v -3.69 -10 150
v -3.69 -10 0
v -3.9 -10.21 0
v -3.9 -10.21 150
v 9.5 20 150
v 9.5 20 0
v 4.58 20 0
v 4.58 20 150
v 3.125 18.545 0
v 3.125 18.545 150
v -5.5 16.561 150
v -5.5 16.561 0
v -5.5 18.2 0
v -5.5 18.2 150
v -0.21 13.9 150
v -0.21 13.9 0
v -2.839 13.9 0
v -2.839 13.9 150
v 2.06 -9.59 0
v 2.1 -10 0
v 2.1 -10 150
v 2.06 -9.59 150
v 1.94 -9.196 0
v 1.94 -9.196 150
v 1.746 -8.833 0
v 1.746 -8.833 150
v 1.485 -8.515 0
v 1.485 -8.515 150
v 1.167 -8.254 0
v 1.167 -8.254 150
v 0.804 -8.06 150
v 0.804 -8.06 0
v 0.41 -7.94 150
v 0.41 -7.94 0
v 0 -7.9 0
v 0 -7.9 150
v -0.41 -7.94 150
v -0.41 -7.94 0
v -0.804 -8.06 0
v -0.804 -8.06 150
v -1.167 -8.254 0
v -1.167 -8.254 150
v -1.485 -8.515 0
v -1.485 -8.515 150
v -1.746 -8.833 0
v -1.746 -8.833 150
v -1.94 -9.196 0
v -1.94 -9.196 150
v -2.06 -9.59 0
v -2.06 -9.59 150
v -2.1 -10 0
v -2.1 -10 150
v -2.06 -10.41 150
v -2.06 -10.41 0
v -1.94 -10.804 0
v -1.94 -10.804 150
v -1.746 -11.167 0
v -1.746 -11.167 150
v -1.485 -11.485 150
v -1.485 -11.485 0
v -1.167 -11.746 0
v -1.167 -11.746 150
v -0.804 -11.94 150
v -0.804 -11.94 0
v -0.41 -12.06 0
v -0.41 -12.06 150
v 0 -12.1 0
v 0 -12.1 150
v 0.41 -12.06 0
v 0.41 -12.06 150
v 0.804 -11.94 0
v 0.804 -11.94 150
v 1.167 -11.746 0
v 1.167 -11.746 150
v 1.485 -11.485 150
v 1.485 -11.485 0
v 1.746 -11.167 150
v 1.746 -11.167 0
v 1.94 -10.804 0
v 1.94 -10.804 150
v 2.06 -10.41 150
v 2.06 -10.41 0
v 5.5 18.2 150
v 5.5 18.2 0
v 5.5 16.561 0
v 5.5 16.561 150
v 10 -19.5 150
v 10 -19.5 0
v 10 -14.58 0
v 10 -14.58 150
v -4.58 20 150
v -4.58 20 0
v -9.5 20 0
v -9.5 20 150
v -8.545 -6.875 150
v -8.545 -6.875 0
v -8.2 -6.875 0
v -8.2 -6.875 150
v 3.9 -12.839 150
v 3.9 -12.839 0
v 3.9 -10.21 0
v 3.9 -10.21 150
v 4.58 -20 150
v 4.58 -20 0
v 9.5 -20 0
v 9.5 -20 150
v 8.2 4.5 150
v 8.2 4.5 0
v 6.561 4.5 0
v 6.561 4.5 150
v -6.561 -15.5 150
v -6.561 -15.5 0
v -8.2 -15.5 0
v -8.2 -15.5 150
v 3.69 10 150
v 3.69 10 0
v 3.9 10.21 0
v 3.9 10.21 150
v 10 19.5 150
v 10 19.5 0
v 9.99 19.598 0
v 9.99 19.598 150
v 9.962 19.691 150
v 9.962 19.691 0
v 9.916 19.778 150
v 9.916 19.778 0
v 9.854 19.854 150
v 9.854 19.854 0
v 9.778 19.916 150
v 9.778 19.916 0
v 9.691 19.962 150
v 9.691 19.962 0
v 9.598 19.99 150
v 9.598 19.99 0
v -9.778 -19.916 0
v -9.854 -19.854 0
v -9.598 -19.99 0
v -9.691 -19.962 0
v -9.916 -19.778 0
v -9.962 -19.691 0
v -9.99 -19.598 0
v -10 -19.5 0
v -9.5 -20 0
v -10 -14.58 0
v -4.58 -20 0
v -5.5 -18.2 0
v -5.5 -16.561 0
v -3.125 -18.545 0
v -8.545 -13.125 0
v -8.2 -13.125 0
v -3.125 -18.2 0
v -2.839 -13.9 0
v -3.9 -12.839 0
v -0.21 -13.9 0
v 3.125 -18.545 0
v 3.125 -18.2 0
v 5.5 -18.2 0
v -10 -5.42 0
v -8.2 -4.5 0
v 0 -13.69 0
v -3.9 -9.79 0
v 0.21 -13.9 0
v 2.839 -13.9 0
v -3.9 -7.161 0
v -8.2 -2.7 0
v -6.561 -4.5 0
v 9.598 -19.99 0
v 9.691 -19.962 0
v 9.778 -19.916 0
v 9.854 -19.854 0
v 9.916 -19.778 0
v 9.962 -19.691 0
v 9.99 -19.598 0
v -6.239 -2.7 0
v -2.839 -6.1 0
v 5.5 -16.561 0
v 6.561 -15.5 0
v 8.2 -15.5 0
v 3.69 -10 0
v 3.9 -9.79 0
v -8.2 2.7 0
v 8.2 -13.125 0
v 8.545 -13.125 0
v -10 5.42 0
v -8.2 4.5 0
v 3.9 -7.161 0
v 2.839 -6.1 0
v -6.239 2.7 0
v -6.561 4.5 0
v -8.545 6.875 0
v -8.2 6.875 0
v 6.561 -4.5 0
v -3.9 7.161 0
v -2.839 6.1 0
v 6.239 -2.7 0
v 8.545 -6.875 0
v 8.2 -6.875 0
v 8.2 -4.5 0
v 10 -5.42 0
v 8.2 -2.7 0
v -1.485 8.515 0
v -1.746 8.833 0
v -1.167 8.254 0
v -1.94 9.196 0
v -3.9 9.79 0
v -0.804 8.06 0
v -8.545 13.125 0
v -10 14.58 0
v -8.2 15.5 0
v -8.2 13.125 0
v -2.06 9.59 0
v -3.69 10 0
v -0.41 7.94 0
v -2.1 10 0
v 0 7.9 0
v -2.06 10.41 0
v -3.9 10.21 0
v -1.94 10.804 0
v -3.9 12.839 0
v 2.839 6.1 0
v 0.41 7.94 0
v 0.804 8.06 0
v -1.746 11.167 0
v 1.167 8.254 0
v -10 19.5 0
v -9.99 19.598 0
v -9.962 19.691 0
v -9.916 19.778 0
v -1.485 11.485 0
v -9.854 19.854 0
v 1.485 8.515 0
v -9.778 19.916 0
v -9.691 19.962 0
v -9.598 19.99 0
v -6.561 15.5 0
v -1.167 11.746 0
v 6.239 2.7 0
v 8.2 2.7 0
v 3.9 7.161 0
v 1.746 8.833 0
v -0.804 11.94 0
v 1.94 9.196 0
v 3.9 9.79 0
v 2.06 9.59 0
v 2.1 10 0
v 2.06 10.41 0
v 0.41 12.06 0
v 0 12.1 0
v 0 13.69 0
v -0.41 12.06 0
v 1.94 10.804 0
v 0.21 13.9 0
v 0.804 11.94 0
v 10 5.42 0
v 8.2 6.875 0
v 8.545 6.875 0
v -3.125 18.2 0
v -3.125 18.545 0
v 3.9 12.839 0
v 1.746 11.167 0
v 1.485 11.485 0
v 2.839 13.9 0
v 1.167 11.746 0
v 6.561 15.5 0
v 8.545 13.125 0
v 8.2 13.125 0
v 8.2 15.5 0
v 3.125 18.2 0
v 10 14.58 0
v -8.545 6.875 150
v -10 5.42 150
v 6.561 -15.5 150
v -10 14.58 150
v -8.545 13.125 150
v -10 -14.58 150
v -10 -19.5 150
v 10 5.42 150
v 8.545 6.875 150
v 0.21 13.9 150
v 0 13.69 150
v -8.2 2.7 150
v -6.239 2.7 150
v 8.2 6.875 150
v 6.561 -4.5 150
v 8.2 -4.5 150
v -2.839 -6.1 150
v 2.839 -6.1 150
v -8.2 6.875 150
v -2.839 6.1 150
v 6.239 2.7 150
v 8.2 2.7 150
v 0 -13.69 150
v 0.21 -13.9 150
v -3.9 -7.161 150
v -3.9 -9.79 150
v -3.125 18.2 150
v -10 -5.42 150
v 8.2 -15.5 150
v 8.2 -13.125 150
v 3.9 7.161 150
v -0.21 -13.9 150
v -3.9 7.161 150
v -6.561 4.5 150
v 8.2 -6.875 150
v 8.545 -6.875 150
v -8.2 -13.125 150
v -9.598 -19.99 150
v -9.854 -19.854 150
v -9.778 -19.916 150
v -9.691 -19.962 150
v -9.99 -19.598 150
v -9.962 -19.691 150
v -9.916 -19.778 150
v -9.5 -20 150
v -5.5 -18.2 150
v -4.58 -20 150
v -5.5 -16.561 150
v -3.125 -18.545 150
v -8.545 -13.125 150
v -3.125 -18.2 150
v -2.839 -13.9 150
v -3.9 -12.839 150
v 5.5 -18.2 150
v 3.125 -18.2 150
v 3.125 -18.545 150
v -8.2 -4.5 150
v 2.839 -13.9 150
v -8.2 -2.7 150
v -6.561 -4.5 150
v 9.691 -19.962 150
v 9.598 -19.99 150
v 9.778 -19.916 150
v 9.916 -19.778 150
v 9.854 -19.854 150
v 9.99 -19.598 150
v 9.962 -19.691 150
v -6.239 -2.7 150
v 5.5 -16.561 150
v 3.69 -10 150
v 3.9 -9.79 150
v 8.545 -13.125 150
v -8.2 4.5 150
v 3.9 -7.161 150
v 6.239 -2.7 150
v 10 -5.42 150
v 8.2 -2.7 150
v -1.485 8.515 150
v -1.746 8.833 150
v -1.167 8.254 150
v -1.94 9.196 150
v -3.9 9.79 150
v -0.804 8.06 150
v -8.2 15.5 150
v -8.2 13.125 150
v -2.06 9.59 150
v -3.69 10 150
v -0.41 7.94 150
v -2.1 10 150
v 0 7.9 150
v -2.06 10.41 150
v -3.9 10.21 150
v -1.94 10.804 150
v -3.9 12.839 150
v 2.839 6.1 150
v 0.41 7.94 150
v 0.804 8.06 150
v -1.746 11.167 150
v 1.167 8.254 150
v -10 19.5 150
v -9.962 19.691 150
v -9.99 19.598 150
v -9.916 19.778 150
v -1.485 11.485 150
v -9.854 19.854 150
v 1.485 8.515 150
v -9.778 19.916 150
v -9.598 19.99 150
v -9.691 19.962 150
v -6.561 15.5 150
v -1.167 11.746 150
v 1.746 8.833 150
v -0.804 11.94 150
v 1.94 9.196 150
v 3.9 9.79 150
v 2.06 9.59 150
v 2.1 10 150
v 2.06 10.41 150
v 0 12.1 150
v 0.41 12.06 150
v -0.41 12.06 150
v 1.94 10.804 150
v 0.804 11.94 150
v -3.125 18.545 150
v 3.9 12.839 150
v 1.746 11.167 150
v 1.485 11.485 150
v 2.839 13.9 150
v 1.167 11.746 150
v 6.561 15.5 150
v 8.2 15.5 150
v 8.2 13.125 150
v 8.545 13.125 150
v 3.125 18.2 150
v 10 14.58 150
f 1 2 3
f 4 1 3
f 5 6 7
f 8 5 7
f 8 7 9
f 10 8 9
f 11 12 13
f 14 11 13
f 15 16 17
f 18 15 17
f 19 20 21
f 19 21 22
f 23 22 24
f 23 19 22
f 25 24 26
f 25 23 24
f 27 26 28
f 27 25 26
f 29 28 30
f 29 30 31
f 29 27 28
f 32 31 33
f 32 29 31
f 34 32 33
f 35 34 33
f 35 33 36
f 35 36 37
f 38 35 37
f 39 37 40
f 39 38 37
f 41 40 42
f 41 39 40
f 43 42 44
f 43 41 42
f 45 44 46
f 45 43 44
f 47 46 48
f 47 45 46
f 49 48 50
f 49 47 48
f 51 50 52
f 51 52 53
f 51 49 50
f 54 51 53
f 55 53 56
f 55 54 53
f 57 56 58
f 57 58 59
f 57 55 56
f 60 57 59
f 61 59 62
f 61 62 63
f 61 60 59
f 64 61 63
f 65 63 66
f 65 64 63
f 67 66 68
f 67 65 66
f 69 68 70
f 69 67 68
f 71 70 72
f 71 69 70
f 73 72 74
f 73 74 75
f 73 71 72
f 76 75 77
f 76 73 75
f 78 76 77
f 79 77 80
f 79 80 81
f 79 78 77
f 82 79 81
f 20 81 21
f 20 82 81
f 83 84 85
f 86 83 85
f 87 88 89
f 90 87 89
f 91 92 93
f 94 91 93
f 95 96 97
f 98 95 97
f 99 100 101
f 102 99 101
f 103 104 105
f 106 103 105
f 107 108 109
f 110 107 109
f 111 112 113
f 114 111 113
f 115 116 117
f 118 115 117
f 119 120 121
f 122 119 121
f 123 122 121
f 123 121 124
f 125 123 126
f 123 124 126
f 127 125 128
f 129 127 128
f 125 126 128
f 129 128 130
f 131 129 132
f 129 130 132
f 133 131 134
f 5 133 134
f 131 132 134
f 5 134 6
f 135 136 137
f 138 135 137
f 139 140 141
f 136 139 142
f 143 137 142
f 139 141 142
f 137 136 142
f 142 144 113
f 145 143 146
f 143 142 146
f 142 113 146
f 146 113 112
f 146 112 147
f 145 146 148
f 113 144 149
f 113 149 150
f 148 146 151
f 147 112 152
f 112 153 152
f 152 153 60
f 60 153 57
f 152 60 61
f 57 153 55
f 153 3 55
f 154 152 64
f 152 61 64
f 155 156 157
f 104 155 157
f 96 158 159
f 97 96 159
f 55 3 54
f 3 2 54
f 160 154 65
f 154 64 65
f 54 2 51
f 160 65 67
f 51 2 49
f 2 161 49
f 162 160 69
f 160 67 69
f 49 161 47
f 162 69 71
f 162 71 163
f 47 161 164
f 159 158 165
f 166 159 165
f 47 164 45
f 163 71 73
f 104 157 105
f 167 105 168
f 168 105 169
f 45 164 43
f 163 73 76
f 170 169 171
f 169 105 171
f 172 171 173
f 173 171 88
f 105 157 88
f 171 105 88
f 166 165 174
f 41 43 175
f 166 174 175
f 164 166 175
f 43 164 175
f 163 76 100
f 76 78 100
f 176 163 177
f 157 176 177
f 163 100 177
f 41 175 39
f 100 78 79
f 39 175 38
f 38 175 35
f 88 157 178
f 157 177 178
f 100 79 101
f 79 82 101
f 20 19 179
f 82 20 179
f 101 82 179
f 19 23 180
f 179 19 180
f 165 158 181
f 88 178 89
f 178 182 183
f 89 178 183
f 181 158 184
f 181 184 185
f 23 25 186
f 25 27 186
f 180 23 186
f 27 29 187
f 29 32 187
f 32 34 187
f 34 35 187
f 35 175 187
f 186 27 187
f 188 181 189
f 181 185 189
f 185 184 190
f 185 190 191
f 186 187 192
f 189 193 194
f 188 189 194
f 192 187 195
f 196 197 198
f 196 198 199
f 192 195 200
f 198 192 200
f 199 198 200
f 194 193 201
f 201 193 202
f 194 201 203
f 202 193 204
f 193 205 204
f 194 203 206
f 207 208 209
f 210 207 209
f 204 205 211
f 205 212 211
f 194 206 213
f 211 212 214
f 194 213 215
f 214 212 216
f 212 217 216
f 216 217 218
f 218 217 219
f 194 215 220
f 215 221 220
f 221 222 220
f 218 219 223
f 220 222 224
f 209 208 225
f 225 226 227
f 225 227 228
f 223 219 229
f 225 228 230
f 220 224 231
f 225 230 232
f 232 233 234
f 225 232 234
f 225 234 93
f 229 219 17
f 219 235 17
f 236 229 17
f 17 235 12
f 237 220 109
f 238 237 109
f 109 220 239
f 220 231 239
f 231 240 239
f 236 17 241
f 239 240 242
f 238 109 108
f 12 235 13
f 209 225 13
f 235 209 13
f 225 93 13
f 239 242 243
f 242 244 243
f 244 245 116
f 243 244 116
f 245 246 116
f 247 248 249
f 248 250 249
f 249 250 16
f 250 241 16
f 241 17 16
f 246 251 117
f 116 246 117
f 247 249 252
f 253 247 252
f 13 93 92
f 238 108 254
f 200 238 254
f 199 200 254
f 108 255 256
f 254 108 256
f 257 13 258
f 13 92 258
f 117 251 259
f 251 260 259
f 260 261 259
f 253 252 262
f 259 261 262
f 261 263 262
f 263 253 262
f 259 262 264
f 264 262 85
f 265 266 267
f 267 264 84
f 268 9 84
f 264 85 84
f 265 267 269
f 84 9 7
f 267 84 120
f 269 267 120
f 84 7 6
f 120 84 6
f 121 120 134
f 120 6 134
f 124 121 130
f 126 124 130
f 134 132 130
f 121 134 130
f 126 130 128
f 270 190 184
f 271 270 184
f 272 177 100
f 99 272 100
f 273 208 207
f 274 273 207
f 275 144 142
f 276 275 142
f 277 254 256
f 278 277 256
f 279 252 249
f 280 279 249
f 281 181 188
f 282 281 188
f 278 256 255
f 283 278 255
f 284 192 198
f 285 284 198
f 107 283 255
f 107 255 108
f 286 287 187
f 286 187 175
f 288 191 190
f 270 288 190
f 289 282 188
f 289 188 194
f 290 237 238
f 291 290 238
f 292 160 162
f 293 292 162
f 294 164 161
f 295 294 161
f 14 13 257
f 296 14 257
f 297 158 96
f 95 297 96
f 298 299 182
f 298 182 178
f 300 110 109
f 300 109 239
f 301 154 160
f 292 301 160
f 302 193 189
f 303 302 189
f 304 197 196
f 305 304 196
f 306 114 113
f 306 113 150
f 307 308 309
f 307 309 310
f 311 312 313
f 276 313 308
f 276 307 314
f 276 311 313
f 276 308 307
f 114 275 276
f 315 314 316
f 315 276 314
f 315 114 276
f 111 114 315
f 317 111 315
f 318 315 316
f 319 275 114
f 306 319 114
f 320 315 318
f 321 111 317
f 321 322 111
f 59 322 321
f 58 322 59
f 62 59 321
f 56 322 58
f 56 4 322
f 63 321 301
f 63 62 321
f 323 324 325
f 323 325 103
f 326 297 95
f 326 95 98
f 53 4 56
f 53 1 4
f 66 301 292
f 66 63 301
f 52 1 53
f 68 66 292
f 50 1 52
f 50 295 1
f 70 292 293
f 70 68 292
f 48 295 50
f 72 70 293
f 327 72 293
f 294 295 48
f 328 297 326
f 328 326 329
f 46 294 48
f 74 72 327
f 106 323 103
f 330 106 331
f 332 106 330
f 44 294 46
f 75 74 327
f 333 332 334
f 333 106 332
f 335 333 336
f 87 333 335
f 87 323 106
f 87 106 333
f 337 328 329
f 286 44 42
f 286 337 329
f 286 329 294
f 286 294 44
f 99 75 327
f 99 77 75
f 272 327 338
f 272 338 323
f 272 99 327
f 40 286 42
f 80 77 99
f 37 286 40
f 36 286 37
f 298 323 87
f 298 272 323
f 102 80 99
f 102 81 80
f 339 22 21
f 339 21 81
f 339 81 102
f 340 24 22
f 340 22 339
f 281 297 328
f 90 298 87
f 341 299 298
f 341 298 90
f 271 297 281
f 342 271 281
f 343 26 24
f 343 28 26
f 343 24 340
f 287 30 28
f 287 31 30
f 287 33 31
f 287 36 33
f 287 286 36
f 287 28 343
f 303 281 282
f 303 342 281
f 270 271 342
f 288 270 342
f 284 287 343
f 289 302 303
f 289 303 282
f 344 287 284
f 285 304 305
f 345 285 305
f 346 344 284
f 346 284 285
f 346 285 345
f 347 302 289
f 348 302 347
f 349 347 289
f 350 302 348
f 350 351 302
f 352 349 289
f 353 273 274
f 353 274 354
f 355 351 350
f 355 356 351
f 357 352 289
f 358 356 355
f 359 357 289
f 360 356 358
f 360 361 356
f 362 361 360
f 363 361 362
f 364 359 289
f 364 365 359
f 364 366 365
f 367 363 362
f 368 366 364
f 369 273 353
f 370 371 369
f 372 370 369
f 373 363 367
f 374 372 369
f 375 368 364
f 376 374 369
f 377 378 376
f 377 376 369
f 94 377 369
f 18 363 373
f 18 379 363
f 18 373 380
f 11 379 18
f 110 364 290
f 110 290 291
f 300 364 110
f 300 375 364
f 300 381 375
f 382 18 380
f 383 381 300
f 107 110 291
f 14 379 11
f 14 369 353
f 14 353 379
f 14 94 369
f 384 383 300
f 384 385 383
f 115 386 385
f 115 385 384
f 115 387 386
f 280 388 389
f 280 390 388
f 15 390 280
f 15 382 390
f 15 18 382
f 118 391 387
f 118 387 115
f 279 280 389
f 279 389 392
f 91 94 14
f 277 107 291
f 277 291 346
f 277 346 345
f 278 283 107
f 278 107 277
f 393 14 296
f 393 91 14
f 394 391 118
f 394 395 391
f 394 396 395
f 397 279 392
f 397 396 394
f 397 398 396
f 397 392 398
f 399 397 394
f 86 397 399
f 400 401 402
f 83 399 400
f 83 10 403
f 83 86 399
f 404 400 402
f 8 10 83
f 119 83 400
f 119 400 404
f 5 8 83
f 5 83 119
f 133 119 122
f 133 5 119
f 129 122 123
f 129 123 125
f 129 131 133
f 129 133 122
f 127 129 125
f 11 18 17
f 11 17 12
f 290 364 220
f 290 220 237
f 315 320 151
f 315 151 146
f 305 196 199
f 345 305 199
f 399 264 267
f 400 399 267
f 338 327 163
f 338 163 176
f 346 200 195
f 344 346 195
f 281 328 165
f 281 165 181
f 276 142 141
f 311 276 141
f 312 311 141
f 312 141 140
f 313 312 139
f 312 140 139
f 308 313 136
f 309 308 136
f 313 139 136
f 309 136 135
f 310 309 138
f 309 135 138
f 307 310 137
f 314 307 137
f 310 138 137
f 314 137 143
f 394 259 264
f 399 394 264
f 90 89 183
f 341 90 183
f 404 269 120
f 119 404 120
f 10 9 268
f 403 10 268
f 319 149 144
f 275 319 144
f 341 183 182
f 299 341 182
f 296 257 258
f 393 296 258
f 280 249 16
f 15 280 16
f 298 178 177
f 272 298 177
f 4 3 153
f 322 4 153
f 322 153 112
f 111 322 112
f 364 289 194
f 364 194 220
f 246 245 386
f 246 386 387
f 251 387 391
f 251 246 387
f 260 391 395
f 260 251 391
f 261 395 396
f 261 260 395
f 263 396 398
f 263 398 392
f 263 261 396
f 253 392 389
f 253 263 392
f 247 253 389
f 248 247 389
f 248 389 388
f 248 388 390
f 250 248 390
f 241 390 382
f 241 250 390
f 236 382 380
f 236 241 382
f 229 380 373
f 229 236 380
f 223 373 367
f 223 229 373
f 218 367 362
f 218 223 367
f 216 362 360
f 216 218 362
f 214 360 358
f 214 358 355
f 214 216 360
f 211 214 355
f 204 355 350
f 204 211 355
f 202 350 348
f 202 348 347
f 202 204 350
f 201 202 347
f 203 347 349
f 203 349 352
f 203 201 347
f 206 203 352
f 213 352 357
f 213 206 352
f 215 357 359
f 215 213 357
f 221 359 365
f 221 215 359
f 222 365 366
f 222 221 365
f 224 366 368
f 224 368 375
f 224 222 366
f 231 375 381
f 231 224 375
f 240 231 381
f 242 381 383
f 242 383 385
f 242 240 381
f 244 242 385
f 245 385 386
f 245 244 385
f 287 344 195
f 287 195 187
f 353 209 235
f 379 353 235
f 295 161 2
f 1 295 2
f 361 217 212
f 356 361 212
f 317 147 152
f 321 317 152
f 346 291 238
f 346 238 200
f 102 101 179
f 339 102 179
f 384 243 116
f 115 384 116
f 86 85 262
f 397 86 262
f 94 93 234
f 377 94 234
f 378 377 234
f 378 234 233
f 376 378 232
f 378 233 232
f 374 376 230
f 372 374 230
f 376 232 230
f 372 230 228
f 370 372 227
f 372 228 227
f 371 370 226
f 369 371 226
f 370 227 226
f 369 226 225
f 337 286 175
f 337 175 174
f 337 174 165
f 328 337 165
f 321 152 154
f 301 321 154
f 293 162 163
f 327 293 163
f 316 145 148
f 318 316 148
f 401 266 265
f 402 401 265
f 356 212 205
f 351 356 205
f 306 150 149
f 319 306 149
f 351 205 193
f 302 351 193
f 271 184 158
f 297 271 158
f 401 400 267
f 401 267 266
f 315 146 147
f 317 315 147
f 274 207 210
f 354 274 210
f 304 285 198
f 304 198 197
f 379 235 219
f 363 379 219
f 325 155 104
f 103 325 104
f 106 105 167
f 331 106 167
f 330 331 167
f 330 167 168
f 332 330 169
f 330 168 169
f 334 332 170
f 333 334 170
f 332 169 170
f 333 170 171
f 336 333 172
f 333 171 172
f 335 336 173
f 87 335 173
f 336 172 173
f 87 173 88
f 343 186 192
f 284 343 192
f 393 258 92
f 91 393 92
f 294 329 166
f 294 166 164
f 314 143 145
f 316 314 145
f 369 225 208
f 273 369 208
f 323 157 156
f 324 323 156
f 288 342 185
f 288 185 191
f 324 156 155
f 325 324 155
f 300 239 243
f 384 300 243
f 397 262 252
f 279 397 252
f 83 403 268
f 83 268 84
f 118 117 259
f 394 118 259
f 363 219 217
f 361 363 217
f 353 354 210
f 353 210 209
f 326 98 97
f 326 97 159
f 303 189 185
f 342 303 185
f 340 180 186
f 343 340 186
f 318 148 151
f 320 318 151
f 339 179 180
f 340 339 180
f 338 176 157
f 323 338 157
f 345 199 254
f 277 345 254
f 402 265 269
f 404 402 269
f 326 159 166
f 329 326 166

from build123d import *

# Parameters (mm, degrees)
SKETCH1_R           = 2.1
BOSS_EXTRUDE1_DEPTH = 150


with BuildPart() as part:
    # Sketch1 → Boss-Extrude1 (new body)
    with BuildSketch(Plane.XY):
        with BuildLine():
            Line((4.58, -20), (9.5, -20))
            ThreePointArc((9.5, -20), (9.853553391, -19.853553391), (10, -19.5))
            Line((10, -19.5), (10, -14.58))
            Line((10, -14.58), (8.545, -13.125))
            Line((8.545, -13.125), (8.2, -13.125))
            Line((8.2, -13.125), (8.2, -15.5))
            Line((8.2, -15.5), (6.560660172, -15.5))
            Line((6.560660172, -15.5), (3.9, -12.839339828))
            Line((3.9, -12.839339828), (3.9, -10.21))
            Line((3.9, -10.21), (3.69, -10))
            Line((3.69, -10), (3.9, -9.79))
            Line((3.9, -9.79), (3.9, -7.160660172))
            Line((3.9, -7.160660172), (6.560660172, -4.5))
            Line((6.560660172, -4.5), (8.2, -4.5))
            Line((8.2, -4.5), (8.2, -6.875))
            Line((8.2, -6.875), (8.545, -6.875))
            Line((8.545, -6.875), (10, -5.42))
            Line((10, -5.42), (10, 5.42))
            Line((10, 5.42), (8.545, 6.875))
            Line((8.545, 6.875), (8.2, 6.875))
            Line((8.2, 6.875), (8.2, 4.5))
            Line((8.2, 4.5), (6.560660172, 4.5))
            Line((6.560660172, 4.5), (3.9, 7.160660172))
            Line((3.9, 7.160660172), (3.9, 9.79))
            Line((3.9, 9.79), (3.69, 10))
            Line((3.69, 10), (3.9, 10.21))
            Line((3.9, 10.21), (3.9, 12.839339828))
            Line((3.9, 12.839339828), (6.560660172, 15.5))
            Line((6.560660172, 15.5), (8.2, 15.5))
            Line((8.2, 15.5), (8.2, 13.125))
            Line((8.2, 13.125), (8.545, 13.125))
            Line((8.545, 13.125), (10, 14.58))
            Line((10, 14.58), (10, 19.5))
            ThreePointArc((10, 19.5), (9.853553391, 19.853553391), (9.5, 20))
            Line((9.5, 20), (4.58, 20))
            Line((4.58, 20), (3.125, 18.545))
            Line((3.125, 18.545), (3.125, 18.2))
            Line((3.125, 18.2), (5.5, 18.2))
            Line((5.5, 18.2), (5.5, 16.560660172))
            Line((5.5, 16.560660172), (2.839339828, 13.9))
            Line((2.839339828, 13.9), (0.21, 13.9))
            Line((0.21, 13.9), (0, 13.69))
            Line((0, 13.69), (-0.21, 13.9))
            Line((-0.21, 13.9), (-2.839339828, 13.9))
            Line((-2.839339828, 13.9), (-5.5, 16.560660172))
            Line((-5.5, 16.560660172), (-5.5, 18.2))
            Line((-5.5, 18.2), (-3.125, 18.2))
            Line((-3.125, 18.2), (-3.125, 18.545))
            Line((-3.125, 18.545), (-4.58, 20))
            Line((-4.58, 20), (-9.5, 20))
            ThreePointArc((-9.5, 20), (-9.853553391, 19.853553391), (-10, 19.5))
            Line((-10, 19.5), (-10, 14.58))
            Line((-10, 14.58), (-8.545, 13.125))
            Line((-8.545, 13.125), (-8.2, 13.125))
            Line((-8.2, 13.125), (-8.2, 15.5))
            Line((-8.2, 15.5), (-6.560660172, 15.5))
            Line((-6.560660172, 15.5), (-3.9, 12.839339828))
            Line((-3.9, 12.839339828), (-3.9, 10.21))
            Line((-3.9, 10.21), (-3.69, 10))
            Line((-3.69, 10), (-3.9, 9.79))
            Line((-3.9, 9.79), (-3.9, 7.160660172))
            Line((-3.9, 7.160660172), (-6.560660172, 4.5))
            Line((-6.560660172, 4.5), (-8.2, 4.5))
            Line((-8.2, 4.5), (-8.2, 6.875))
            Line((-8.2, 6.875), (-8.545, 6.875))
            Line((-8.545, 6.875), (-10, 5.42))
            Line((-10, 5.42), (-10, -5.42))
            Line((-10, -5.42), (-8.545, -6.875))
            Line((-8.545, -6.875), (-8.2, -6.875))
            Line((-8.2, -6.875), (-8.2, -4.5))
            Line((-8.2, -4.5), (-6.560660172, -4.5))
            Line((-6.560660172, -4.5), (-3.9, -7.160660172))
            Line((-3.9, -7.160660172), (-3.9, -9.79))
            Line((-3.9, -9.79), (-3.69, -10))
            Line((-3.69, -10), (-3.9, -10.21))
            Line((-3.9, -10.21), (-3.9, -12.839339828))
            Line((-3.9, -12.839339828), (-6.560660172, -15.5))
            Line((-6.560660172, -15.5), (-8.2, -15.5))
            Line((-8.2, -15.5), (-8.2, -13.125))
            Line((-8.2, -13.125), (-8.545, -13.125))
            Line((-8.545, -13.125), (-10, -14.58))
            Line((-10, -14.58), (-10, -19.5))
            ThreePointArc((-10, -19.5), (-9.853553391, -19.853553391), (-9.5, -20))
            Line((-9.5, -20), (-4.58, -20))
            Line((-4.58, -20), (-3.125, -18.545))
            Line((-3.125, -18.545), (-3.125, -18.2))
            Line((-3.125, -18.2), (-5.5, -18.2))
            Line((-5.5, -18.2), (-5.5, -16.560660172))
            Line((-5.5, -16.560660172), (-2.839339828, -13.9))
            Line((-2.839339828, -13.9), (-0.21, -13.9))
            Line((-0.21, -13.9), (0, -13.69))
            Line((0, -13.69), (0.21, -13.9))
            Line((0.21, -13.9), (2.839339828, -13.9))
            Line((2.839339828, -13.9), (5.5, -16.560660172))
            Line((5.5, -16.560660172), (5.5, -18.2))
            Line((5.5, -18.2), (3.125, -18.2))
            Line((3.125, -18.2), (3.125, -18.545))
            Line((3.125, -18.545), (4.58, -20))
        make_face()
        with Locations((0, -10)):
            Circle(SKETCH1_R, mode=Mode.SUBTRACT)
        Polygon((-6.239339828, -2.7), (-8.2, -2.7), (-8.2, 2.7), (-6.239339828, 2.7), (-2.839339828, 6.1), (2.839339828, 6.1), (6.239339828, 2.7), (8.2, 2.7), (8.2, -2.7), (6.239339828, -2.7), (2.839339828, -6.1), (-2.839339828, -6.1), align=None, mode=Mode.SUBTRACT)
        with Locations((0, 10)):
            Circle(SKETCH1_R, mode=Mode.SUBTRACT)
    extrude(amount=BOSS_EXTRUDE1_DEPTH)


solid = part.part
